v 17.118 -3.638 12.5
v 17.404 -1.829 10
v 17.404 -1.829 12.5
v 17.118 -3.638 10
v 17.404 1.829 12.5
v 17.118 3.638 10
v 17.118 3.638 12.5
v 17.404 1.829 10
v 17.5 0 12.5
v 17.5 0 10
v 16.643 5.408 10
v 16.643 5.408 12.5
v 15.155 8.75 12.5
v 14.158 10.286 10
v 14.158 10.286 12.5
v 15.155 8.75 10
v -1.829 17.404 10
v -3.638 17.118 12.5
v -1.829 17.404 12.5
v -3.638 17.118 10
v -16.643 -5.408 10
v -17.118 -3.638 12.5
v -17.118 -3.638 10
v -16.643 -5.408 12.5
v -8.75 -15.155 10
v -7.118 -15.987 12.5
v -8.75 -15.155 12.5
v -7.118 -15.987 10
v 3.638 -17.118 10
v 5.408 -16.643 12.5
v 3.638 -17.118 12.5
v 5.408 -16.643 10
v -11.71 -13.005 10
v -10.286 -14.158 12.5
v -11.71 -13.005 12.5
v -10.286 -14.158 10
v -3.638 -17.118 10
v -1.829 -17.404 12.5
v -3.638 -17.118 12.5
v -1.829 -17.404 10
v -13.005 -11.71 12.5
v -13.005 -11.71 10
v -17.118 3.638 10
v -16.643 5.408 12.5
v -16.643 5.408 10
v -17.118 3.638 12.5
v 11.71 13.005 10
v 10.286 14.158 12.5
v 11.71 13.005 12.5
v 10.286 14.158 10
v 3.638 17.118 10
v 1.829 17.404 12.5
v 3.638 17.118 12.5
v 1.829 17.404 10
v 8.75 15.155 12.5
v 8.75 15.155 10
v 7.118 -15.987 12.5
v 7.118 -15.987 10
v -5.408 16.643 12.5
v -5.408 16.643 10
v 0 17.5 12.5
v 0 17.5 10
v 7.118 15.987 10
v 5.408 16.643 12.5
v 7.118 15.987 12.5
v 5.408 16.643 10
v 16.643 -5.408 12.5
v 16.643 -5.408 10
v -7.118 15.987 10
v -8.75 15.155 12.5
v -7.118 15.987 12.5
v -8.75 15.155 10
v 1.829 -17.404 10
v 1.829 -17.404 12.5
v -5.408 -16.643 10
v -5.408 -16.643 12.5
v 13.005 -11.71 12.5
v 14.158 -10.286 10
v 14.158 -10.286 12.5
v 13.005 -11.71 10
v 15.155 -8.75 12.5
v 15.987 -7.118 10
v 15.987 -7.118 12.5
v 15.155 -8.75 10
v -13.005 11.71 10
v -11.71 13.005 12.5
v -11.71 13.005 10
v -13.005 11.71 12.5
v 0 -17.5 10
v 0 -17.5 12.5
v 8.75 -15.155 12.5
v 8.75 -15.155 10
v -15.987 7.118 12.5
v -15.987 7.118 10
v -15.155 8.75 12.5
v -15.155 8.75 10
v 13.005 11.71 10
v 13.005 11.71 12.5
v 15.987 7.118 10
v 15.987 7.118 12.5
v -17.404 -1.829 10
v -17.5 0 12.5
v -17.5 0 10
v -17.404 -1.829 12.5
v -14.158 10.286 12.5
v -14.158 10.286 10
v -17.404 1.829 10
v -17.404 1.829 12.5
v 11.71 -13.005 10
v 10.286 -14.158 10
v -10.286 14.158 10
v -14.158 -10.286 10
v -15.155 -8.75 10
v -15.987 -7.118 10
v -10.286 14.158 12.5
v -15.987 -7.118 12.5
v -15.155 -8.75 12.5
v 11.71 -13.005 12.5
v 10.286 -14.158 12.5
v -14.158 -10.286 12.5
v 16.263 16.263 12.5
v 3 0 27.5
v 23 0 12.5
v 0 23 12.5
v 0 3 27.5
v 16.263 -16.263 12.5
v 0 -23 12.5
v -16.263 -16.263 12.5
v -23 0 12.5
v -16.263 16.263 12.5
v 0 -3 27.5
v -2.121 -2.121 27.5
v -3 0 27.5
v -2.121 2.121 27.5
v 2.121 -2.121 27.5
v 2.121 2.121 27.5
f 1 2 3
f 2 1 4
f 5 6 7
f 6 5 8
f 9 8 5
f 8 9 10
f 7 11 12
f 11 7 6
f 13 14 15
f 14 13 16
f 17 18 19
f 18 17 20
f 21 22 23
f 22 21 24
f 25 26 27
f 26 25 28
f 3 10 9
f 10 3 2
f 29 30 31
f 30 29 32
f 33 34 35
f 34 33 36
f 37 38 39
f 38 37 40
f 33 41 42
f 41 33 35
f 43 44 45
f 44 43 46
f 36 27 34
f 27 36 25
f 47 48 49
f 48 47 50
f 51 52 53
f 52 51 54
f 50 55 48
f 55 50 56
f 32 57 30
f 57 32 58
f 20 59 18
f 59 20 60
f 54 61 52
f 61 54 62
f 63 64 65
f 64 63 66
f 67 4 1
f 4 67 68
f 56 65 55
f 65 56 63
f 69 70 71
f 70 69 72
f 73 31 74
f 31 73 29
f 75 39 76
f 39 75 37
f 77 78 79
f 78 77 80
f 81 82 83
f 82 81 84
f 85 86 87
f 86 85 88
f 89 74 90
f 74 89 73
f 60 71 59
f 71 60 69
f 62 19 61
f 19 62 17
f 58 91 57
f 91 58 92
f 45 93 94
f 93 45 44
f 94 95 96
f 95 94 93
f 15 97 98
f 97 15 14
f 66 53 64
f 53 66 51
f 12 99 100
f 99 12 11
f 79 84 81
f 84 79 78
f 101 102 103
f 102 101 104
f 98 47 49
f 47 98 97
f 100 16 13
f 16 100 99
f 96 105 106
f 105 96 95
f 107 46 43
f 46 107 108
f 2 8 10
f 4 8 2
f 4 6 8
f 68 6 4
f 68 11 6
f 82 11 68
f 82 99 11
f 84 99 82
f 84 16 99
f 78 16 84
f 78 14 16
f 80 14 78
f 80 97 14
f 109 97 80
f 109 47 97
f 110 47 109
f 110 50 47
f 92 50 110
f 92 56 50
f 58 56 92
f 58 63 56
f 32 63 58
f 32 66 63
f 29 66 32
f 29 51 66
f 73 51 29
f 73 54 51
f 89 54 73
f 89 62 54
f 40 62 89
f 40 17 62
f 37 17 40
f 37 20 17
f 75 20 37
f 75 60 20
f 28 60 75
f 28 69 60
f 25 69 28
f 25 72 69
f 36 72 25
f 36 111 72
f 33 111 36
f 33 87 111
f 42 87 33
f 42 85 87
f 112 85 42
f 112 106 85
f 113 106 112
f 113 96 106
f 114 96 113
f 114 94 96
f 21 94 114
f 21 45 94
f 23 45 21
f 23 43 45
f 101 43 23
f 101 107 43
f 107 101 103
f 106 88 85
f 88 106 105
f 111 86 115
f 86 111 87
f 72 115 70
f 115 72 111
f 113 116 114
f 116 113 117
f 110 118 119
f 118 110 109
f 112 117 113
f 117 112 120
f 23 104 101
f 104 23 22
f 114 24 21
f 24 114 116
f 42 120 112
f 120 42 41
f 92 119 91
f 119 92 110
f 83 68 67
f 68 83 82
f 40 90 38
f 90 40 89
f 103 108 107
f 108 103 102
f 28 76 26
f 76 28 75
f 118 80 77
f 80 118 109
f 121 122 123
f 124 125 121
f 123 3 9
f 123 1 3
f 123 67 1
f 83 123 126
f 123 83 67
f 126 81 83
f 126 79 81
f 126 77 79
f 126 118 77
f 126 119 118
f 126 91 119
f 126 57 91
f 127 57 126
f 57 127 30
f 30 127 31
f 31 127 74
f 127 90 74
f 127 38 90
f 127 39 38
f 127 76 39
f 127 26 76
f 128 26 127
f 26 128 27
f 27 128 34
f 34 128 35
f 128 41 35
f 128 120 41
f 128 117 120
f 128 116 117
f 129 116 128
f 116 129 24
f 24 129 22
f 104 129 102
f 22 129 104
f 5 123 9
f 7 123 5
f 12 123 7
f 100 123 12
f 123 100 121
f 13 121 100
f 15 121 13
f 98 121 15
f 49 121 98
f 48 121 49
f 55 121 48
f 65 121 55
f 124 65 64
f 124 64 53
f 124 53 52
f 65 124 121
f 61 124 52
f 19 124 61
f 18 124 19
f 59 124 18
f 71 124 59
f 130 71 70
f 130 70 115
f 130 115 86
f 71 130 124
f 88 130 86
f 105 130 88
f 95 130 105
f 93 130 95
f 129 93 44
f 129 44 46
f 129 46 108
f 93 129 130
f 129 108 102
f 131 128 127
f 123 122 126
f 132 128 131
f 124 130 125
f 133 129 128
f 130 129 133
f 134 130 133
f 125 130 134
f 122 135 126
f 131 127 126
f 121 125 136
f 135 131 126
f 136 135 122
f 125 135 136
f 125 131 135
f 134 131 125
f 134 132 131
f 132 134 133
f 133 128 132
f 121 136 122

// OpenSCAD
$fn = 60;

module piece1(){
    
    difference(){
        union(){
            translate([0, 0, -13]) cylinder(15, d=22);
            translate([0, 0, -12]) cylinder(3, d=35);
            translate([0, 0, -13]) cylinder(2, d=45);
        }

        union(){
            for(i=[0:10]){
                rotate([0,0,i*32.5]) translate([12, 0, 1]) rotate([90, 0, 90]) cylinder(6.8, d=4.85, center = true);
            }
            translate([0, 0, -15]) cylinder(25, d=18);
        }
    }
    
    for(i=[0:15]){
        rotate([0,0,i*22.5]) translate([18,0,-12]){
                difference(){
                    cube([4, 3,7]);
                    rotate([0, 30, 0]) translate([-7, -1, 0]) cube([5, 4.5,15]);
                    translate([3.5, -1, 2]) cube([1, 5, 1]);
                    translate([3.5, -1, 4]) cube([1, 5, 1]);
                }
            } 
    }
    
}

module piece1b(){
    
    difference(){
        union(){
            translate([0, 0, -36]) cylinder(h=25, r1=20, r2=15, center=false);
            translate([0, 0, -36]) cylinder(2, d=60);
        }
        union(){
            for(i=[0:3]){
                rotate([0, 0, i * 90]) translate([21, 0, -25]) cube([10, 10,15], center = true);
            }
            translate([0, 0, -37]) cylinder(h=30, r1=15, r2=10, center=false);
        }
    }
    
    for(i=[0:15]){
        rotate([0,0,i*22.5]) translate([24,0,-35]){
                difference(){
                    cube([5, 3,10]);
                    rotate([0, 30, 0]) translate([-7, -1, 0]) cube([5, 4.5,15]);
                    translate([4.5, -1, 2]) cube([1, 5, 1]);
                    translate([4.5, -1, 4]) cube([1, 5, 1]);
                    translate([4.5, -1, 6]) cube([1, 5, 1]);
                    translate([4.5, -1, 8]) cube([1, 5, 1]);
                }
            } 
    }
}

module piece2(){
    difference(){
        union(){
            translate([0, 0, -48]) cylinder(h=24, r1=20, r2=18, center=true);
            translate([0, 0, -38]) cylinder(2, d=60);
        }
        translate([0, 0, -47]) cylinder(h=28, r1=16, r2=18, center=true);
    }
    for(i=[0:15]){
        rotate([0,0,i*22.5]) translate([20,0,-38]){
            translate([3,0,0]) cube([9, 3, 3], center=true);
            difference(){
                rotate([90, 0, 0]) translate([4,1,0]) cylinder(3, d = 10, center = true);
                translate([3,0,5.5]) cube([15, 5, 8], center=true);
            }
            translate([3,0,-6]) rotate([0, 30, 0]) cube([3, 3, 10], center = true, $fn = 4);
            translate([1.8,0,-9]) rotate([0, 10, 0]) cube([3, 3, 20], center = true, $fn = 4);
            translate([0,0,-10]) cube([3, 3, 20], center=true);
        }
    }
}

module tower(){


translate([0, 0, -180]) cylinder(h=245, r1=40, r2=20, center=true);
}

module doorTop(){
    difference(){
        union(){
            cylinder(h=3, r=52, center=true, $fn=8);
            translate([0, 0, 6]) cube([20, 20, 15],center = true);
            translate([0, 0, 3]) cylinder(h=5, r=40, center=true);
        }
        translate([0, 0, 6]) cube([15, 15, 25],center = true);
    }
}

module foundation(){
    difference(){
    union(){
    cylinder(h=3, r=60, center=true, $fn=8);
    translate([0, 0, -3]) cylinder(h=3, r=64, center=true, $fn=8);
    translate([0, 0, -6]) cylinder(h=3, r=68, center=true, $fn=8);
    translate([0, 0, -9]) cylinder(h=3, r=72, center=true, $fn=8);
    translate([0, 0, 2]) cylinder(h=2, r=46, center=true, $fn=8);
    }
    translate([0, 0, 0]) cylinder(h=40, r=36, center=true, $fn=8);
}
}

module post(){
    translate([0, 0, 10]) difference(){
                    cube([5, 3,20]);
                    translate([4.5, -1, 4]) cube([1, 5, 1]);
                    translate([4.5, -1, 8]) cube([1, 5, 1]);
                    translate([4.5, -1, 12]) cube([1, 5, 1]);
                    translate([4.5, -1, 16]) cube([1, 5, 1]);
    }
}

module base(){
    difference(){
        translate([0, 0, 11]) cube([165, 165, 4], center=true);
        translate([0, 0, 12]) cube([150, 150, 2], center=true);
        translate([0, 0, 12]) cube([140, 140, 10], center=true);
    }
    translate([0, 30, 11]) cube([165, 10, 4], center=true);
    translate([0, -30, 11]) cube([165, 10, 4], center=true);
    
    for(i=[0:3]){
        rotate([0, 0, i * 90]){
            translate([75, 0, 0]) post();
            for(j=[0:4]){
                translate([75, j * 16, 0]) post();
            }
            for(j=[0:4]){
                translate([75, -j * 16, 0]) post();
            }
        }
    }
    
}

module doors(){
    for(i=[0:0]){
        rotate([0, 0, i*45 + 22.5]) translate([44, 0, 0]){
            difference(){
                cube([3, 40, 40],center = true);
                translate([0, -20, 0]) rotate([0, 0, 22.5 + 45]) cube([3, 10, 45],center = true);
                translate([0, 20, 0]) rotate([0, 0, -22.5 - 45]) cube([3, 10, 45],center = true);
                translate([0, 0, 0]) cube([5, 30, 3],center = true);
                translate([0, 0, 2.5]) cube([5, 32, 3],center = true);
                translate([0, 0, 5]) cube([5, 30, 3],center = true);
                translate([0, 0, 7.5]) cube([5, 32, 3],center = true);
                translate([0, 0, 10]) cube([5, 30, 3],center = true);
                translate([0, 0, 12.5]) cube([5, 32, 3],center = true);
                translate([0, 0, 15]) cube([5, 30, 3],center = true);
                
                translate([0, 0, -2.5]) cube([5, 32, 3],center = true);
                translate([0, 0, -5]) cube([5, 30, 3],center = true);
                translate([0, 0, -7.5]) cube([5, 32, 3],center = true);
                translate([0, 0, -10]) cube([5, 30, 3],center = true);
                translate([0, 0, -12.5]) cube([5, 32, 3],center = true);
            }
        }
    }
    
}

module roof(){
    translate([0, 0, -10]) cylinder(3, d=35);
    cylinder(h=15, r1=23, r2=3, center=true, $fn=8);
    
}

translate([0, 0, 20]) roof();
//piece1();
//piece1b();
//piece2();
//tower();
//translate([0, 0, -333]) doorTop();
//translate([0, 0, -325]) doors();
//doors();
//translate([0, 0, -343]) foundation();
//translate([0, 0, -370]) base();
